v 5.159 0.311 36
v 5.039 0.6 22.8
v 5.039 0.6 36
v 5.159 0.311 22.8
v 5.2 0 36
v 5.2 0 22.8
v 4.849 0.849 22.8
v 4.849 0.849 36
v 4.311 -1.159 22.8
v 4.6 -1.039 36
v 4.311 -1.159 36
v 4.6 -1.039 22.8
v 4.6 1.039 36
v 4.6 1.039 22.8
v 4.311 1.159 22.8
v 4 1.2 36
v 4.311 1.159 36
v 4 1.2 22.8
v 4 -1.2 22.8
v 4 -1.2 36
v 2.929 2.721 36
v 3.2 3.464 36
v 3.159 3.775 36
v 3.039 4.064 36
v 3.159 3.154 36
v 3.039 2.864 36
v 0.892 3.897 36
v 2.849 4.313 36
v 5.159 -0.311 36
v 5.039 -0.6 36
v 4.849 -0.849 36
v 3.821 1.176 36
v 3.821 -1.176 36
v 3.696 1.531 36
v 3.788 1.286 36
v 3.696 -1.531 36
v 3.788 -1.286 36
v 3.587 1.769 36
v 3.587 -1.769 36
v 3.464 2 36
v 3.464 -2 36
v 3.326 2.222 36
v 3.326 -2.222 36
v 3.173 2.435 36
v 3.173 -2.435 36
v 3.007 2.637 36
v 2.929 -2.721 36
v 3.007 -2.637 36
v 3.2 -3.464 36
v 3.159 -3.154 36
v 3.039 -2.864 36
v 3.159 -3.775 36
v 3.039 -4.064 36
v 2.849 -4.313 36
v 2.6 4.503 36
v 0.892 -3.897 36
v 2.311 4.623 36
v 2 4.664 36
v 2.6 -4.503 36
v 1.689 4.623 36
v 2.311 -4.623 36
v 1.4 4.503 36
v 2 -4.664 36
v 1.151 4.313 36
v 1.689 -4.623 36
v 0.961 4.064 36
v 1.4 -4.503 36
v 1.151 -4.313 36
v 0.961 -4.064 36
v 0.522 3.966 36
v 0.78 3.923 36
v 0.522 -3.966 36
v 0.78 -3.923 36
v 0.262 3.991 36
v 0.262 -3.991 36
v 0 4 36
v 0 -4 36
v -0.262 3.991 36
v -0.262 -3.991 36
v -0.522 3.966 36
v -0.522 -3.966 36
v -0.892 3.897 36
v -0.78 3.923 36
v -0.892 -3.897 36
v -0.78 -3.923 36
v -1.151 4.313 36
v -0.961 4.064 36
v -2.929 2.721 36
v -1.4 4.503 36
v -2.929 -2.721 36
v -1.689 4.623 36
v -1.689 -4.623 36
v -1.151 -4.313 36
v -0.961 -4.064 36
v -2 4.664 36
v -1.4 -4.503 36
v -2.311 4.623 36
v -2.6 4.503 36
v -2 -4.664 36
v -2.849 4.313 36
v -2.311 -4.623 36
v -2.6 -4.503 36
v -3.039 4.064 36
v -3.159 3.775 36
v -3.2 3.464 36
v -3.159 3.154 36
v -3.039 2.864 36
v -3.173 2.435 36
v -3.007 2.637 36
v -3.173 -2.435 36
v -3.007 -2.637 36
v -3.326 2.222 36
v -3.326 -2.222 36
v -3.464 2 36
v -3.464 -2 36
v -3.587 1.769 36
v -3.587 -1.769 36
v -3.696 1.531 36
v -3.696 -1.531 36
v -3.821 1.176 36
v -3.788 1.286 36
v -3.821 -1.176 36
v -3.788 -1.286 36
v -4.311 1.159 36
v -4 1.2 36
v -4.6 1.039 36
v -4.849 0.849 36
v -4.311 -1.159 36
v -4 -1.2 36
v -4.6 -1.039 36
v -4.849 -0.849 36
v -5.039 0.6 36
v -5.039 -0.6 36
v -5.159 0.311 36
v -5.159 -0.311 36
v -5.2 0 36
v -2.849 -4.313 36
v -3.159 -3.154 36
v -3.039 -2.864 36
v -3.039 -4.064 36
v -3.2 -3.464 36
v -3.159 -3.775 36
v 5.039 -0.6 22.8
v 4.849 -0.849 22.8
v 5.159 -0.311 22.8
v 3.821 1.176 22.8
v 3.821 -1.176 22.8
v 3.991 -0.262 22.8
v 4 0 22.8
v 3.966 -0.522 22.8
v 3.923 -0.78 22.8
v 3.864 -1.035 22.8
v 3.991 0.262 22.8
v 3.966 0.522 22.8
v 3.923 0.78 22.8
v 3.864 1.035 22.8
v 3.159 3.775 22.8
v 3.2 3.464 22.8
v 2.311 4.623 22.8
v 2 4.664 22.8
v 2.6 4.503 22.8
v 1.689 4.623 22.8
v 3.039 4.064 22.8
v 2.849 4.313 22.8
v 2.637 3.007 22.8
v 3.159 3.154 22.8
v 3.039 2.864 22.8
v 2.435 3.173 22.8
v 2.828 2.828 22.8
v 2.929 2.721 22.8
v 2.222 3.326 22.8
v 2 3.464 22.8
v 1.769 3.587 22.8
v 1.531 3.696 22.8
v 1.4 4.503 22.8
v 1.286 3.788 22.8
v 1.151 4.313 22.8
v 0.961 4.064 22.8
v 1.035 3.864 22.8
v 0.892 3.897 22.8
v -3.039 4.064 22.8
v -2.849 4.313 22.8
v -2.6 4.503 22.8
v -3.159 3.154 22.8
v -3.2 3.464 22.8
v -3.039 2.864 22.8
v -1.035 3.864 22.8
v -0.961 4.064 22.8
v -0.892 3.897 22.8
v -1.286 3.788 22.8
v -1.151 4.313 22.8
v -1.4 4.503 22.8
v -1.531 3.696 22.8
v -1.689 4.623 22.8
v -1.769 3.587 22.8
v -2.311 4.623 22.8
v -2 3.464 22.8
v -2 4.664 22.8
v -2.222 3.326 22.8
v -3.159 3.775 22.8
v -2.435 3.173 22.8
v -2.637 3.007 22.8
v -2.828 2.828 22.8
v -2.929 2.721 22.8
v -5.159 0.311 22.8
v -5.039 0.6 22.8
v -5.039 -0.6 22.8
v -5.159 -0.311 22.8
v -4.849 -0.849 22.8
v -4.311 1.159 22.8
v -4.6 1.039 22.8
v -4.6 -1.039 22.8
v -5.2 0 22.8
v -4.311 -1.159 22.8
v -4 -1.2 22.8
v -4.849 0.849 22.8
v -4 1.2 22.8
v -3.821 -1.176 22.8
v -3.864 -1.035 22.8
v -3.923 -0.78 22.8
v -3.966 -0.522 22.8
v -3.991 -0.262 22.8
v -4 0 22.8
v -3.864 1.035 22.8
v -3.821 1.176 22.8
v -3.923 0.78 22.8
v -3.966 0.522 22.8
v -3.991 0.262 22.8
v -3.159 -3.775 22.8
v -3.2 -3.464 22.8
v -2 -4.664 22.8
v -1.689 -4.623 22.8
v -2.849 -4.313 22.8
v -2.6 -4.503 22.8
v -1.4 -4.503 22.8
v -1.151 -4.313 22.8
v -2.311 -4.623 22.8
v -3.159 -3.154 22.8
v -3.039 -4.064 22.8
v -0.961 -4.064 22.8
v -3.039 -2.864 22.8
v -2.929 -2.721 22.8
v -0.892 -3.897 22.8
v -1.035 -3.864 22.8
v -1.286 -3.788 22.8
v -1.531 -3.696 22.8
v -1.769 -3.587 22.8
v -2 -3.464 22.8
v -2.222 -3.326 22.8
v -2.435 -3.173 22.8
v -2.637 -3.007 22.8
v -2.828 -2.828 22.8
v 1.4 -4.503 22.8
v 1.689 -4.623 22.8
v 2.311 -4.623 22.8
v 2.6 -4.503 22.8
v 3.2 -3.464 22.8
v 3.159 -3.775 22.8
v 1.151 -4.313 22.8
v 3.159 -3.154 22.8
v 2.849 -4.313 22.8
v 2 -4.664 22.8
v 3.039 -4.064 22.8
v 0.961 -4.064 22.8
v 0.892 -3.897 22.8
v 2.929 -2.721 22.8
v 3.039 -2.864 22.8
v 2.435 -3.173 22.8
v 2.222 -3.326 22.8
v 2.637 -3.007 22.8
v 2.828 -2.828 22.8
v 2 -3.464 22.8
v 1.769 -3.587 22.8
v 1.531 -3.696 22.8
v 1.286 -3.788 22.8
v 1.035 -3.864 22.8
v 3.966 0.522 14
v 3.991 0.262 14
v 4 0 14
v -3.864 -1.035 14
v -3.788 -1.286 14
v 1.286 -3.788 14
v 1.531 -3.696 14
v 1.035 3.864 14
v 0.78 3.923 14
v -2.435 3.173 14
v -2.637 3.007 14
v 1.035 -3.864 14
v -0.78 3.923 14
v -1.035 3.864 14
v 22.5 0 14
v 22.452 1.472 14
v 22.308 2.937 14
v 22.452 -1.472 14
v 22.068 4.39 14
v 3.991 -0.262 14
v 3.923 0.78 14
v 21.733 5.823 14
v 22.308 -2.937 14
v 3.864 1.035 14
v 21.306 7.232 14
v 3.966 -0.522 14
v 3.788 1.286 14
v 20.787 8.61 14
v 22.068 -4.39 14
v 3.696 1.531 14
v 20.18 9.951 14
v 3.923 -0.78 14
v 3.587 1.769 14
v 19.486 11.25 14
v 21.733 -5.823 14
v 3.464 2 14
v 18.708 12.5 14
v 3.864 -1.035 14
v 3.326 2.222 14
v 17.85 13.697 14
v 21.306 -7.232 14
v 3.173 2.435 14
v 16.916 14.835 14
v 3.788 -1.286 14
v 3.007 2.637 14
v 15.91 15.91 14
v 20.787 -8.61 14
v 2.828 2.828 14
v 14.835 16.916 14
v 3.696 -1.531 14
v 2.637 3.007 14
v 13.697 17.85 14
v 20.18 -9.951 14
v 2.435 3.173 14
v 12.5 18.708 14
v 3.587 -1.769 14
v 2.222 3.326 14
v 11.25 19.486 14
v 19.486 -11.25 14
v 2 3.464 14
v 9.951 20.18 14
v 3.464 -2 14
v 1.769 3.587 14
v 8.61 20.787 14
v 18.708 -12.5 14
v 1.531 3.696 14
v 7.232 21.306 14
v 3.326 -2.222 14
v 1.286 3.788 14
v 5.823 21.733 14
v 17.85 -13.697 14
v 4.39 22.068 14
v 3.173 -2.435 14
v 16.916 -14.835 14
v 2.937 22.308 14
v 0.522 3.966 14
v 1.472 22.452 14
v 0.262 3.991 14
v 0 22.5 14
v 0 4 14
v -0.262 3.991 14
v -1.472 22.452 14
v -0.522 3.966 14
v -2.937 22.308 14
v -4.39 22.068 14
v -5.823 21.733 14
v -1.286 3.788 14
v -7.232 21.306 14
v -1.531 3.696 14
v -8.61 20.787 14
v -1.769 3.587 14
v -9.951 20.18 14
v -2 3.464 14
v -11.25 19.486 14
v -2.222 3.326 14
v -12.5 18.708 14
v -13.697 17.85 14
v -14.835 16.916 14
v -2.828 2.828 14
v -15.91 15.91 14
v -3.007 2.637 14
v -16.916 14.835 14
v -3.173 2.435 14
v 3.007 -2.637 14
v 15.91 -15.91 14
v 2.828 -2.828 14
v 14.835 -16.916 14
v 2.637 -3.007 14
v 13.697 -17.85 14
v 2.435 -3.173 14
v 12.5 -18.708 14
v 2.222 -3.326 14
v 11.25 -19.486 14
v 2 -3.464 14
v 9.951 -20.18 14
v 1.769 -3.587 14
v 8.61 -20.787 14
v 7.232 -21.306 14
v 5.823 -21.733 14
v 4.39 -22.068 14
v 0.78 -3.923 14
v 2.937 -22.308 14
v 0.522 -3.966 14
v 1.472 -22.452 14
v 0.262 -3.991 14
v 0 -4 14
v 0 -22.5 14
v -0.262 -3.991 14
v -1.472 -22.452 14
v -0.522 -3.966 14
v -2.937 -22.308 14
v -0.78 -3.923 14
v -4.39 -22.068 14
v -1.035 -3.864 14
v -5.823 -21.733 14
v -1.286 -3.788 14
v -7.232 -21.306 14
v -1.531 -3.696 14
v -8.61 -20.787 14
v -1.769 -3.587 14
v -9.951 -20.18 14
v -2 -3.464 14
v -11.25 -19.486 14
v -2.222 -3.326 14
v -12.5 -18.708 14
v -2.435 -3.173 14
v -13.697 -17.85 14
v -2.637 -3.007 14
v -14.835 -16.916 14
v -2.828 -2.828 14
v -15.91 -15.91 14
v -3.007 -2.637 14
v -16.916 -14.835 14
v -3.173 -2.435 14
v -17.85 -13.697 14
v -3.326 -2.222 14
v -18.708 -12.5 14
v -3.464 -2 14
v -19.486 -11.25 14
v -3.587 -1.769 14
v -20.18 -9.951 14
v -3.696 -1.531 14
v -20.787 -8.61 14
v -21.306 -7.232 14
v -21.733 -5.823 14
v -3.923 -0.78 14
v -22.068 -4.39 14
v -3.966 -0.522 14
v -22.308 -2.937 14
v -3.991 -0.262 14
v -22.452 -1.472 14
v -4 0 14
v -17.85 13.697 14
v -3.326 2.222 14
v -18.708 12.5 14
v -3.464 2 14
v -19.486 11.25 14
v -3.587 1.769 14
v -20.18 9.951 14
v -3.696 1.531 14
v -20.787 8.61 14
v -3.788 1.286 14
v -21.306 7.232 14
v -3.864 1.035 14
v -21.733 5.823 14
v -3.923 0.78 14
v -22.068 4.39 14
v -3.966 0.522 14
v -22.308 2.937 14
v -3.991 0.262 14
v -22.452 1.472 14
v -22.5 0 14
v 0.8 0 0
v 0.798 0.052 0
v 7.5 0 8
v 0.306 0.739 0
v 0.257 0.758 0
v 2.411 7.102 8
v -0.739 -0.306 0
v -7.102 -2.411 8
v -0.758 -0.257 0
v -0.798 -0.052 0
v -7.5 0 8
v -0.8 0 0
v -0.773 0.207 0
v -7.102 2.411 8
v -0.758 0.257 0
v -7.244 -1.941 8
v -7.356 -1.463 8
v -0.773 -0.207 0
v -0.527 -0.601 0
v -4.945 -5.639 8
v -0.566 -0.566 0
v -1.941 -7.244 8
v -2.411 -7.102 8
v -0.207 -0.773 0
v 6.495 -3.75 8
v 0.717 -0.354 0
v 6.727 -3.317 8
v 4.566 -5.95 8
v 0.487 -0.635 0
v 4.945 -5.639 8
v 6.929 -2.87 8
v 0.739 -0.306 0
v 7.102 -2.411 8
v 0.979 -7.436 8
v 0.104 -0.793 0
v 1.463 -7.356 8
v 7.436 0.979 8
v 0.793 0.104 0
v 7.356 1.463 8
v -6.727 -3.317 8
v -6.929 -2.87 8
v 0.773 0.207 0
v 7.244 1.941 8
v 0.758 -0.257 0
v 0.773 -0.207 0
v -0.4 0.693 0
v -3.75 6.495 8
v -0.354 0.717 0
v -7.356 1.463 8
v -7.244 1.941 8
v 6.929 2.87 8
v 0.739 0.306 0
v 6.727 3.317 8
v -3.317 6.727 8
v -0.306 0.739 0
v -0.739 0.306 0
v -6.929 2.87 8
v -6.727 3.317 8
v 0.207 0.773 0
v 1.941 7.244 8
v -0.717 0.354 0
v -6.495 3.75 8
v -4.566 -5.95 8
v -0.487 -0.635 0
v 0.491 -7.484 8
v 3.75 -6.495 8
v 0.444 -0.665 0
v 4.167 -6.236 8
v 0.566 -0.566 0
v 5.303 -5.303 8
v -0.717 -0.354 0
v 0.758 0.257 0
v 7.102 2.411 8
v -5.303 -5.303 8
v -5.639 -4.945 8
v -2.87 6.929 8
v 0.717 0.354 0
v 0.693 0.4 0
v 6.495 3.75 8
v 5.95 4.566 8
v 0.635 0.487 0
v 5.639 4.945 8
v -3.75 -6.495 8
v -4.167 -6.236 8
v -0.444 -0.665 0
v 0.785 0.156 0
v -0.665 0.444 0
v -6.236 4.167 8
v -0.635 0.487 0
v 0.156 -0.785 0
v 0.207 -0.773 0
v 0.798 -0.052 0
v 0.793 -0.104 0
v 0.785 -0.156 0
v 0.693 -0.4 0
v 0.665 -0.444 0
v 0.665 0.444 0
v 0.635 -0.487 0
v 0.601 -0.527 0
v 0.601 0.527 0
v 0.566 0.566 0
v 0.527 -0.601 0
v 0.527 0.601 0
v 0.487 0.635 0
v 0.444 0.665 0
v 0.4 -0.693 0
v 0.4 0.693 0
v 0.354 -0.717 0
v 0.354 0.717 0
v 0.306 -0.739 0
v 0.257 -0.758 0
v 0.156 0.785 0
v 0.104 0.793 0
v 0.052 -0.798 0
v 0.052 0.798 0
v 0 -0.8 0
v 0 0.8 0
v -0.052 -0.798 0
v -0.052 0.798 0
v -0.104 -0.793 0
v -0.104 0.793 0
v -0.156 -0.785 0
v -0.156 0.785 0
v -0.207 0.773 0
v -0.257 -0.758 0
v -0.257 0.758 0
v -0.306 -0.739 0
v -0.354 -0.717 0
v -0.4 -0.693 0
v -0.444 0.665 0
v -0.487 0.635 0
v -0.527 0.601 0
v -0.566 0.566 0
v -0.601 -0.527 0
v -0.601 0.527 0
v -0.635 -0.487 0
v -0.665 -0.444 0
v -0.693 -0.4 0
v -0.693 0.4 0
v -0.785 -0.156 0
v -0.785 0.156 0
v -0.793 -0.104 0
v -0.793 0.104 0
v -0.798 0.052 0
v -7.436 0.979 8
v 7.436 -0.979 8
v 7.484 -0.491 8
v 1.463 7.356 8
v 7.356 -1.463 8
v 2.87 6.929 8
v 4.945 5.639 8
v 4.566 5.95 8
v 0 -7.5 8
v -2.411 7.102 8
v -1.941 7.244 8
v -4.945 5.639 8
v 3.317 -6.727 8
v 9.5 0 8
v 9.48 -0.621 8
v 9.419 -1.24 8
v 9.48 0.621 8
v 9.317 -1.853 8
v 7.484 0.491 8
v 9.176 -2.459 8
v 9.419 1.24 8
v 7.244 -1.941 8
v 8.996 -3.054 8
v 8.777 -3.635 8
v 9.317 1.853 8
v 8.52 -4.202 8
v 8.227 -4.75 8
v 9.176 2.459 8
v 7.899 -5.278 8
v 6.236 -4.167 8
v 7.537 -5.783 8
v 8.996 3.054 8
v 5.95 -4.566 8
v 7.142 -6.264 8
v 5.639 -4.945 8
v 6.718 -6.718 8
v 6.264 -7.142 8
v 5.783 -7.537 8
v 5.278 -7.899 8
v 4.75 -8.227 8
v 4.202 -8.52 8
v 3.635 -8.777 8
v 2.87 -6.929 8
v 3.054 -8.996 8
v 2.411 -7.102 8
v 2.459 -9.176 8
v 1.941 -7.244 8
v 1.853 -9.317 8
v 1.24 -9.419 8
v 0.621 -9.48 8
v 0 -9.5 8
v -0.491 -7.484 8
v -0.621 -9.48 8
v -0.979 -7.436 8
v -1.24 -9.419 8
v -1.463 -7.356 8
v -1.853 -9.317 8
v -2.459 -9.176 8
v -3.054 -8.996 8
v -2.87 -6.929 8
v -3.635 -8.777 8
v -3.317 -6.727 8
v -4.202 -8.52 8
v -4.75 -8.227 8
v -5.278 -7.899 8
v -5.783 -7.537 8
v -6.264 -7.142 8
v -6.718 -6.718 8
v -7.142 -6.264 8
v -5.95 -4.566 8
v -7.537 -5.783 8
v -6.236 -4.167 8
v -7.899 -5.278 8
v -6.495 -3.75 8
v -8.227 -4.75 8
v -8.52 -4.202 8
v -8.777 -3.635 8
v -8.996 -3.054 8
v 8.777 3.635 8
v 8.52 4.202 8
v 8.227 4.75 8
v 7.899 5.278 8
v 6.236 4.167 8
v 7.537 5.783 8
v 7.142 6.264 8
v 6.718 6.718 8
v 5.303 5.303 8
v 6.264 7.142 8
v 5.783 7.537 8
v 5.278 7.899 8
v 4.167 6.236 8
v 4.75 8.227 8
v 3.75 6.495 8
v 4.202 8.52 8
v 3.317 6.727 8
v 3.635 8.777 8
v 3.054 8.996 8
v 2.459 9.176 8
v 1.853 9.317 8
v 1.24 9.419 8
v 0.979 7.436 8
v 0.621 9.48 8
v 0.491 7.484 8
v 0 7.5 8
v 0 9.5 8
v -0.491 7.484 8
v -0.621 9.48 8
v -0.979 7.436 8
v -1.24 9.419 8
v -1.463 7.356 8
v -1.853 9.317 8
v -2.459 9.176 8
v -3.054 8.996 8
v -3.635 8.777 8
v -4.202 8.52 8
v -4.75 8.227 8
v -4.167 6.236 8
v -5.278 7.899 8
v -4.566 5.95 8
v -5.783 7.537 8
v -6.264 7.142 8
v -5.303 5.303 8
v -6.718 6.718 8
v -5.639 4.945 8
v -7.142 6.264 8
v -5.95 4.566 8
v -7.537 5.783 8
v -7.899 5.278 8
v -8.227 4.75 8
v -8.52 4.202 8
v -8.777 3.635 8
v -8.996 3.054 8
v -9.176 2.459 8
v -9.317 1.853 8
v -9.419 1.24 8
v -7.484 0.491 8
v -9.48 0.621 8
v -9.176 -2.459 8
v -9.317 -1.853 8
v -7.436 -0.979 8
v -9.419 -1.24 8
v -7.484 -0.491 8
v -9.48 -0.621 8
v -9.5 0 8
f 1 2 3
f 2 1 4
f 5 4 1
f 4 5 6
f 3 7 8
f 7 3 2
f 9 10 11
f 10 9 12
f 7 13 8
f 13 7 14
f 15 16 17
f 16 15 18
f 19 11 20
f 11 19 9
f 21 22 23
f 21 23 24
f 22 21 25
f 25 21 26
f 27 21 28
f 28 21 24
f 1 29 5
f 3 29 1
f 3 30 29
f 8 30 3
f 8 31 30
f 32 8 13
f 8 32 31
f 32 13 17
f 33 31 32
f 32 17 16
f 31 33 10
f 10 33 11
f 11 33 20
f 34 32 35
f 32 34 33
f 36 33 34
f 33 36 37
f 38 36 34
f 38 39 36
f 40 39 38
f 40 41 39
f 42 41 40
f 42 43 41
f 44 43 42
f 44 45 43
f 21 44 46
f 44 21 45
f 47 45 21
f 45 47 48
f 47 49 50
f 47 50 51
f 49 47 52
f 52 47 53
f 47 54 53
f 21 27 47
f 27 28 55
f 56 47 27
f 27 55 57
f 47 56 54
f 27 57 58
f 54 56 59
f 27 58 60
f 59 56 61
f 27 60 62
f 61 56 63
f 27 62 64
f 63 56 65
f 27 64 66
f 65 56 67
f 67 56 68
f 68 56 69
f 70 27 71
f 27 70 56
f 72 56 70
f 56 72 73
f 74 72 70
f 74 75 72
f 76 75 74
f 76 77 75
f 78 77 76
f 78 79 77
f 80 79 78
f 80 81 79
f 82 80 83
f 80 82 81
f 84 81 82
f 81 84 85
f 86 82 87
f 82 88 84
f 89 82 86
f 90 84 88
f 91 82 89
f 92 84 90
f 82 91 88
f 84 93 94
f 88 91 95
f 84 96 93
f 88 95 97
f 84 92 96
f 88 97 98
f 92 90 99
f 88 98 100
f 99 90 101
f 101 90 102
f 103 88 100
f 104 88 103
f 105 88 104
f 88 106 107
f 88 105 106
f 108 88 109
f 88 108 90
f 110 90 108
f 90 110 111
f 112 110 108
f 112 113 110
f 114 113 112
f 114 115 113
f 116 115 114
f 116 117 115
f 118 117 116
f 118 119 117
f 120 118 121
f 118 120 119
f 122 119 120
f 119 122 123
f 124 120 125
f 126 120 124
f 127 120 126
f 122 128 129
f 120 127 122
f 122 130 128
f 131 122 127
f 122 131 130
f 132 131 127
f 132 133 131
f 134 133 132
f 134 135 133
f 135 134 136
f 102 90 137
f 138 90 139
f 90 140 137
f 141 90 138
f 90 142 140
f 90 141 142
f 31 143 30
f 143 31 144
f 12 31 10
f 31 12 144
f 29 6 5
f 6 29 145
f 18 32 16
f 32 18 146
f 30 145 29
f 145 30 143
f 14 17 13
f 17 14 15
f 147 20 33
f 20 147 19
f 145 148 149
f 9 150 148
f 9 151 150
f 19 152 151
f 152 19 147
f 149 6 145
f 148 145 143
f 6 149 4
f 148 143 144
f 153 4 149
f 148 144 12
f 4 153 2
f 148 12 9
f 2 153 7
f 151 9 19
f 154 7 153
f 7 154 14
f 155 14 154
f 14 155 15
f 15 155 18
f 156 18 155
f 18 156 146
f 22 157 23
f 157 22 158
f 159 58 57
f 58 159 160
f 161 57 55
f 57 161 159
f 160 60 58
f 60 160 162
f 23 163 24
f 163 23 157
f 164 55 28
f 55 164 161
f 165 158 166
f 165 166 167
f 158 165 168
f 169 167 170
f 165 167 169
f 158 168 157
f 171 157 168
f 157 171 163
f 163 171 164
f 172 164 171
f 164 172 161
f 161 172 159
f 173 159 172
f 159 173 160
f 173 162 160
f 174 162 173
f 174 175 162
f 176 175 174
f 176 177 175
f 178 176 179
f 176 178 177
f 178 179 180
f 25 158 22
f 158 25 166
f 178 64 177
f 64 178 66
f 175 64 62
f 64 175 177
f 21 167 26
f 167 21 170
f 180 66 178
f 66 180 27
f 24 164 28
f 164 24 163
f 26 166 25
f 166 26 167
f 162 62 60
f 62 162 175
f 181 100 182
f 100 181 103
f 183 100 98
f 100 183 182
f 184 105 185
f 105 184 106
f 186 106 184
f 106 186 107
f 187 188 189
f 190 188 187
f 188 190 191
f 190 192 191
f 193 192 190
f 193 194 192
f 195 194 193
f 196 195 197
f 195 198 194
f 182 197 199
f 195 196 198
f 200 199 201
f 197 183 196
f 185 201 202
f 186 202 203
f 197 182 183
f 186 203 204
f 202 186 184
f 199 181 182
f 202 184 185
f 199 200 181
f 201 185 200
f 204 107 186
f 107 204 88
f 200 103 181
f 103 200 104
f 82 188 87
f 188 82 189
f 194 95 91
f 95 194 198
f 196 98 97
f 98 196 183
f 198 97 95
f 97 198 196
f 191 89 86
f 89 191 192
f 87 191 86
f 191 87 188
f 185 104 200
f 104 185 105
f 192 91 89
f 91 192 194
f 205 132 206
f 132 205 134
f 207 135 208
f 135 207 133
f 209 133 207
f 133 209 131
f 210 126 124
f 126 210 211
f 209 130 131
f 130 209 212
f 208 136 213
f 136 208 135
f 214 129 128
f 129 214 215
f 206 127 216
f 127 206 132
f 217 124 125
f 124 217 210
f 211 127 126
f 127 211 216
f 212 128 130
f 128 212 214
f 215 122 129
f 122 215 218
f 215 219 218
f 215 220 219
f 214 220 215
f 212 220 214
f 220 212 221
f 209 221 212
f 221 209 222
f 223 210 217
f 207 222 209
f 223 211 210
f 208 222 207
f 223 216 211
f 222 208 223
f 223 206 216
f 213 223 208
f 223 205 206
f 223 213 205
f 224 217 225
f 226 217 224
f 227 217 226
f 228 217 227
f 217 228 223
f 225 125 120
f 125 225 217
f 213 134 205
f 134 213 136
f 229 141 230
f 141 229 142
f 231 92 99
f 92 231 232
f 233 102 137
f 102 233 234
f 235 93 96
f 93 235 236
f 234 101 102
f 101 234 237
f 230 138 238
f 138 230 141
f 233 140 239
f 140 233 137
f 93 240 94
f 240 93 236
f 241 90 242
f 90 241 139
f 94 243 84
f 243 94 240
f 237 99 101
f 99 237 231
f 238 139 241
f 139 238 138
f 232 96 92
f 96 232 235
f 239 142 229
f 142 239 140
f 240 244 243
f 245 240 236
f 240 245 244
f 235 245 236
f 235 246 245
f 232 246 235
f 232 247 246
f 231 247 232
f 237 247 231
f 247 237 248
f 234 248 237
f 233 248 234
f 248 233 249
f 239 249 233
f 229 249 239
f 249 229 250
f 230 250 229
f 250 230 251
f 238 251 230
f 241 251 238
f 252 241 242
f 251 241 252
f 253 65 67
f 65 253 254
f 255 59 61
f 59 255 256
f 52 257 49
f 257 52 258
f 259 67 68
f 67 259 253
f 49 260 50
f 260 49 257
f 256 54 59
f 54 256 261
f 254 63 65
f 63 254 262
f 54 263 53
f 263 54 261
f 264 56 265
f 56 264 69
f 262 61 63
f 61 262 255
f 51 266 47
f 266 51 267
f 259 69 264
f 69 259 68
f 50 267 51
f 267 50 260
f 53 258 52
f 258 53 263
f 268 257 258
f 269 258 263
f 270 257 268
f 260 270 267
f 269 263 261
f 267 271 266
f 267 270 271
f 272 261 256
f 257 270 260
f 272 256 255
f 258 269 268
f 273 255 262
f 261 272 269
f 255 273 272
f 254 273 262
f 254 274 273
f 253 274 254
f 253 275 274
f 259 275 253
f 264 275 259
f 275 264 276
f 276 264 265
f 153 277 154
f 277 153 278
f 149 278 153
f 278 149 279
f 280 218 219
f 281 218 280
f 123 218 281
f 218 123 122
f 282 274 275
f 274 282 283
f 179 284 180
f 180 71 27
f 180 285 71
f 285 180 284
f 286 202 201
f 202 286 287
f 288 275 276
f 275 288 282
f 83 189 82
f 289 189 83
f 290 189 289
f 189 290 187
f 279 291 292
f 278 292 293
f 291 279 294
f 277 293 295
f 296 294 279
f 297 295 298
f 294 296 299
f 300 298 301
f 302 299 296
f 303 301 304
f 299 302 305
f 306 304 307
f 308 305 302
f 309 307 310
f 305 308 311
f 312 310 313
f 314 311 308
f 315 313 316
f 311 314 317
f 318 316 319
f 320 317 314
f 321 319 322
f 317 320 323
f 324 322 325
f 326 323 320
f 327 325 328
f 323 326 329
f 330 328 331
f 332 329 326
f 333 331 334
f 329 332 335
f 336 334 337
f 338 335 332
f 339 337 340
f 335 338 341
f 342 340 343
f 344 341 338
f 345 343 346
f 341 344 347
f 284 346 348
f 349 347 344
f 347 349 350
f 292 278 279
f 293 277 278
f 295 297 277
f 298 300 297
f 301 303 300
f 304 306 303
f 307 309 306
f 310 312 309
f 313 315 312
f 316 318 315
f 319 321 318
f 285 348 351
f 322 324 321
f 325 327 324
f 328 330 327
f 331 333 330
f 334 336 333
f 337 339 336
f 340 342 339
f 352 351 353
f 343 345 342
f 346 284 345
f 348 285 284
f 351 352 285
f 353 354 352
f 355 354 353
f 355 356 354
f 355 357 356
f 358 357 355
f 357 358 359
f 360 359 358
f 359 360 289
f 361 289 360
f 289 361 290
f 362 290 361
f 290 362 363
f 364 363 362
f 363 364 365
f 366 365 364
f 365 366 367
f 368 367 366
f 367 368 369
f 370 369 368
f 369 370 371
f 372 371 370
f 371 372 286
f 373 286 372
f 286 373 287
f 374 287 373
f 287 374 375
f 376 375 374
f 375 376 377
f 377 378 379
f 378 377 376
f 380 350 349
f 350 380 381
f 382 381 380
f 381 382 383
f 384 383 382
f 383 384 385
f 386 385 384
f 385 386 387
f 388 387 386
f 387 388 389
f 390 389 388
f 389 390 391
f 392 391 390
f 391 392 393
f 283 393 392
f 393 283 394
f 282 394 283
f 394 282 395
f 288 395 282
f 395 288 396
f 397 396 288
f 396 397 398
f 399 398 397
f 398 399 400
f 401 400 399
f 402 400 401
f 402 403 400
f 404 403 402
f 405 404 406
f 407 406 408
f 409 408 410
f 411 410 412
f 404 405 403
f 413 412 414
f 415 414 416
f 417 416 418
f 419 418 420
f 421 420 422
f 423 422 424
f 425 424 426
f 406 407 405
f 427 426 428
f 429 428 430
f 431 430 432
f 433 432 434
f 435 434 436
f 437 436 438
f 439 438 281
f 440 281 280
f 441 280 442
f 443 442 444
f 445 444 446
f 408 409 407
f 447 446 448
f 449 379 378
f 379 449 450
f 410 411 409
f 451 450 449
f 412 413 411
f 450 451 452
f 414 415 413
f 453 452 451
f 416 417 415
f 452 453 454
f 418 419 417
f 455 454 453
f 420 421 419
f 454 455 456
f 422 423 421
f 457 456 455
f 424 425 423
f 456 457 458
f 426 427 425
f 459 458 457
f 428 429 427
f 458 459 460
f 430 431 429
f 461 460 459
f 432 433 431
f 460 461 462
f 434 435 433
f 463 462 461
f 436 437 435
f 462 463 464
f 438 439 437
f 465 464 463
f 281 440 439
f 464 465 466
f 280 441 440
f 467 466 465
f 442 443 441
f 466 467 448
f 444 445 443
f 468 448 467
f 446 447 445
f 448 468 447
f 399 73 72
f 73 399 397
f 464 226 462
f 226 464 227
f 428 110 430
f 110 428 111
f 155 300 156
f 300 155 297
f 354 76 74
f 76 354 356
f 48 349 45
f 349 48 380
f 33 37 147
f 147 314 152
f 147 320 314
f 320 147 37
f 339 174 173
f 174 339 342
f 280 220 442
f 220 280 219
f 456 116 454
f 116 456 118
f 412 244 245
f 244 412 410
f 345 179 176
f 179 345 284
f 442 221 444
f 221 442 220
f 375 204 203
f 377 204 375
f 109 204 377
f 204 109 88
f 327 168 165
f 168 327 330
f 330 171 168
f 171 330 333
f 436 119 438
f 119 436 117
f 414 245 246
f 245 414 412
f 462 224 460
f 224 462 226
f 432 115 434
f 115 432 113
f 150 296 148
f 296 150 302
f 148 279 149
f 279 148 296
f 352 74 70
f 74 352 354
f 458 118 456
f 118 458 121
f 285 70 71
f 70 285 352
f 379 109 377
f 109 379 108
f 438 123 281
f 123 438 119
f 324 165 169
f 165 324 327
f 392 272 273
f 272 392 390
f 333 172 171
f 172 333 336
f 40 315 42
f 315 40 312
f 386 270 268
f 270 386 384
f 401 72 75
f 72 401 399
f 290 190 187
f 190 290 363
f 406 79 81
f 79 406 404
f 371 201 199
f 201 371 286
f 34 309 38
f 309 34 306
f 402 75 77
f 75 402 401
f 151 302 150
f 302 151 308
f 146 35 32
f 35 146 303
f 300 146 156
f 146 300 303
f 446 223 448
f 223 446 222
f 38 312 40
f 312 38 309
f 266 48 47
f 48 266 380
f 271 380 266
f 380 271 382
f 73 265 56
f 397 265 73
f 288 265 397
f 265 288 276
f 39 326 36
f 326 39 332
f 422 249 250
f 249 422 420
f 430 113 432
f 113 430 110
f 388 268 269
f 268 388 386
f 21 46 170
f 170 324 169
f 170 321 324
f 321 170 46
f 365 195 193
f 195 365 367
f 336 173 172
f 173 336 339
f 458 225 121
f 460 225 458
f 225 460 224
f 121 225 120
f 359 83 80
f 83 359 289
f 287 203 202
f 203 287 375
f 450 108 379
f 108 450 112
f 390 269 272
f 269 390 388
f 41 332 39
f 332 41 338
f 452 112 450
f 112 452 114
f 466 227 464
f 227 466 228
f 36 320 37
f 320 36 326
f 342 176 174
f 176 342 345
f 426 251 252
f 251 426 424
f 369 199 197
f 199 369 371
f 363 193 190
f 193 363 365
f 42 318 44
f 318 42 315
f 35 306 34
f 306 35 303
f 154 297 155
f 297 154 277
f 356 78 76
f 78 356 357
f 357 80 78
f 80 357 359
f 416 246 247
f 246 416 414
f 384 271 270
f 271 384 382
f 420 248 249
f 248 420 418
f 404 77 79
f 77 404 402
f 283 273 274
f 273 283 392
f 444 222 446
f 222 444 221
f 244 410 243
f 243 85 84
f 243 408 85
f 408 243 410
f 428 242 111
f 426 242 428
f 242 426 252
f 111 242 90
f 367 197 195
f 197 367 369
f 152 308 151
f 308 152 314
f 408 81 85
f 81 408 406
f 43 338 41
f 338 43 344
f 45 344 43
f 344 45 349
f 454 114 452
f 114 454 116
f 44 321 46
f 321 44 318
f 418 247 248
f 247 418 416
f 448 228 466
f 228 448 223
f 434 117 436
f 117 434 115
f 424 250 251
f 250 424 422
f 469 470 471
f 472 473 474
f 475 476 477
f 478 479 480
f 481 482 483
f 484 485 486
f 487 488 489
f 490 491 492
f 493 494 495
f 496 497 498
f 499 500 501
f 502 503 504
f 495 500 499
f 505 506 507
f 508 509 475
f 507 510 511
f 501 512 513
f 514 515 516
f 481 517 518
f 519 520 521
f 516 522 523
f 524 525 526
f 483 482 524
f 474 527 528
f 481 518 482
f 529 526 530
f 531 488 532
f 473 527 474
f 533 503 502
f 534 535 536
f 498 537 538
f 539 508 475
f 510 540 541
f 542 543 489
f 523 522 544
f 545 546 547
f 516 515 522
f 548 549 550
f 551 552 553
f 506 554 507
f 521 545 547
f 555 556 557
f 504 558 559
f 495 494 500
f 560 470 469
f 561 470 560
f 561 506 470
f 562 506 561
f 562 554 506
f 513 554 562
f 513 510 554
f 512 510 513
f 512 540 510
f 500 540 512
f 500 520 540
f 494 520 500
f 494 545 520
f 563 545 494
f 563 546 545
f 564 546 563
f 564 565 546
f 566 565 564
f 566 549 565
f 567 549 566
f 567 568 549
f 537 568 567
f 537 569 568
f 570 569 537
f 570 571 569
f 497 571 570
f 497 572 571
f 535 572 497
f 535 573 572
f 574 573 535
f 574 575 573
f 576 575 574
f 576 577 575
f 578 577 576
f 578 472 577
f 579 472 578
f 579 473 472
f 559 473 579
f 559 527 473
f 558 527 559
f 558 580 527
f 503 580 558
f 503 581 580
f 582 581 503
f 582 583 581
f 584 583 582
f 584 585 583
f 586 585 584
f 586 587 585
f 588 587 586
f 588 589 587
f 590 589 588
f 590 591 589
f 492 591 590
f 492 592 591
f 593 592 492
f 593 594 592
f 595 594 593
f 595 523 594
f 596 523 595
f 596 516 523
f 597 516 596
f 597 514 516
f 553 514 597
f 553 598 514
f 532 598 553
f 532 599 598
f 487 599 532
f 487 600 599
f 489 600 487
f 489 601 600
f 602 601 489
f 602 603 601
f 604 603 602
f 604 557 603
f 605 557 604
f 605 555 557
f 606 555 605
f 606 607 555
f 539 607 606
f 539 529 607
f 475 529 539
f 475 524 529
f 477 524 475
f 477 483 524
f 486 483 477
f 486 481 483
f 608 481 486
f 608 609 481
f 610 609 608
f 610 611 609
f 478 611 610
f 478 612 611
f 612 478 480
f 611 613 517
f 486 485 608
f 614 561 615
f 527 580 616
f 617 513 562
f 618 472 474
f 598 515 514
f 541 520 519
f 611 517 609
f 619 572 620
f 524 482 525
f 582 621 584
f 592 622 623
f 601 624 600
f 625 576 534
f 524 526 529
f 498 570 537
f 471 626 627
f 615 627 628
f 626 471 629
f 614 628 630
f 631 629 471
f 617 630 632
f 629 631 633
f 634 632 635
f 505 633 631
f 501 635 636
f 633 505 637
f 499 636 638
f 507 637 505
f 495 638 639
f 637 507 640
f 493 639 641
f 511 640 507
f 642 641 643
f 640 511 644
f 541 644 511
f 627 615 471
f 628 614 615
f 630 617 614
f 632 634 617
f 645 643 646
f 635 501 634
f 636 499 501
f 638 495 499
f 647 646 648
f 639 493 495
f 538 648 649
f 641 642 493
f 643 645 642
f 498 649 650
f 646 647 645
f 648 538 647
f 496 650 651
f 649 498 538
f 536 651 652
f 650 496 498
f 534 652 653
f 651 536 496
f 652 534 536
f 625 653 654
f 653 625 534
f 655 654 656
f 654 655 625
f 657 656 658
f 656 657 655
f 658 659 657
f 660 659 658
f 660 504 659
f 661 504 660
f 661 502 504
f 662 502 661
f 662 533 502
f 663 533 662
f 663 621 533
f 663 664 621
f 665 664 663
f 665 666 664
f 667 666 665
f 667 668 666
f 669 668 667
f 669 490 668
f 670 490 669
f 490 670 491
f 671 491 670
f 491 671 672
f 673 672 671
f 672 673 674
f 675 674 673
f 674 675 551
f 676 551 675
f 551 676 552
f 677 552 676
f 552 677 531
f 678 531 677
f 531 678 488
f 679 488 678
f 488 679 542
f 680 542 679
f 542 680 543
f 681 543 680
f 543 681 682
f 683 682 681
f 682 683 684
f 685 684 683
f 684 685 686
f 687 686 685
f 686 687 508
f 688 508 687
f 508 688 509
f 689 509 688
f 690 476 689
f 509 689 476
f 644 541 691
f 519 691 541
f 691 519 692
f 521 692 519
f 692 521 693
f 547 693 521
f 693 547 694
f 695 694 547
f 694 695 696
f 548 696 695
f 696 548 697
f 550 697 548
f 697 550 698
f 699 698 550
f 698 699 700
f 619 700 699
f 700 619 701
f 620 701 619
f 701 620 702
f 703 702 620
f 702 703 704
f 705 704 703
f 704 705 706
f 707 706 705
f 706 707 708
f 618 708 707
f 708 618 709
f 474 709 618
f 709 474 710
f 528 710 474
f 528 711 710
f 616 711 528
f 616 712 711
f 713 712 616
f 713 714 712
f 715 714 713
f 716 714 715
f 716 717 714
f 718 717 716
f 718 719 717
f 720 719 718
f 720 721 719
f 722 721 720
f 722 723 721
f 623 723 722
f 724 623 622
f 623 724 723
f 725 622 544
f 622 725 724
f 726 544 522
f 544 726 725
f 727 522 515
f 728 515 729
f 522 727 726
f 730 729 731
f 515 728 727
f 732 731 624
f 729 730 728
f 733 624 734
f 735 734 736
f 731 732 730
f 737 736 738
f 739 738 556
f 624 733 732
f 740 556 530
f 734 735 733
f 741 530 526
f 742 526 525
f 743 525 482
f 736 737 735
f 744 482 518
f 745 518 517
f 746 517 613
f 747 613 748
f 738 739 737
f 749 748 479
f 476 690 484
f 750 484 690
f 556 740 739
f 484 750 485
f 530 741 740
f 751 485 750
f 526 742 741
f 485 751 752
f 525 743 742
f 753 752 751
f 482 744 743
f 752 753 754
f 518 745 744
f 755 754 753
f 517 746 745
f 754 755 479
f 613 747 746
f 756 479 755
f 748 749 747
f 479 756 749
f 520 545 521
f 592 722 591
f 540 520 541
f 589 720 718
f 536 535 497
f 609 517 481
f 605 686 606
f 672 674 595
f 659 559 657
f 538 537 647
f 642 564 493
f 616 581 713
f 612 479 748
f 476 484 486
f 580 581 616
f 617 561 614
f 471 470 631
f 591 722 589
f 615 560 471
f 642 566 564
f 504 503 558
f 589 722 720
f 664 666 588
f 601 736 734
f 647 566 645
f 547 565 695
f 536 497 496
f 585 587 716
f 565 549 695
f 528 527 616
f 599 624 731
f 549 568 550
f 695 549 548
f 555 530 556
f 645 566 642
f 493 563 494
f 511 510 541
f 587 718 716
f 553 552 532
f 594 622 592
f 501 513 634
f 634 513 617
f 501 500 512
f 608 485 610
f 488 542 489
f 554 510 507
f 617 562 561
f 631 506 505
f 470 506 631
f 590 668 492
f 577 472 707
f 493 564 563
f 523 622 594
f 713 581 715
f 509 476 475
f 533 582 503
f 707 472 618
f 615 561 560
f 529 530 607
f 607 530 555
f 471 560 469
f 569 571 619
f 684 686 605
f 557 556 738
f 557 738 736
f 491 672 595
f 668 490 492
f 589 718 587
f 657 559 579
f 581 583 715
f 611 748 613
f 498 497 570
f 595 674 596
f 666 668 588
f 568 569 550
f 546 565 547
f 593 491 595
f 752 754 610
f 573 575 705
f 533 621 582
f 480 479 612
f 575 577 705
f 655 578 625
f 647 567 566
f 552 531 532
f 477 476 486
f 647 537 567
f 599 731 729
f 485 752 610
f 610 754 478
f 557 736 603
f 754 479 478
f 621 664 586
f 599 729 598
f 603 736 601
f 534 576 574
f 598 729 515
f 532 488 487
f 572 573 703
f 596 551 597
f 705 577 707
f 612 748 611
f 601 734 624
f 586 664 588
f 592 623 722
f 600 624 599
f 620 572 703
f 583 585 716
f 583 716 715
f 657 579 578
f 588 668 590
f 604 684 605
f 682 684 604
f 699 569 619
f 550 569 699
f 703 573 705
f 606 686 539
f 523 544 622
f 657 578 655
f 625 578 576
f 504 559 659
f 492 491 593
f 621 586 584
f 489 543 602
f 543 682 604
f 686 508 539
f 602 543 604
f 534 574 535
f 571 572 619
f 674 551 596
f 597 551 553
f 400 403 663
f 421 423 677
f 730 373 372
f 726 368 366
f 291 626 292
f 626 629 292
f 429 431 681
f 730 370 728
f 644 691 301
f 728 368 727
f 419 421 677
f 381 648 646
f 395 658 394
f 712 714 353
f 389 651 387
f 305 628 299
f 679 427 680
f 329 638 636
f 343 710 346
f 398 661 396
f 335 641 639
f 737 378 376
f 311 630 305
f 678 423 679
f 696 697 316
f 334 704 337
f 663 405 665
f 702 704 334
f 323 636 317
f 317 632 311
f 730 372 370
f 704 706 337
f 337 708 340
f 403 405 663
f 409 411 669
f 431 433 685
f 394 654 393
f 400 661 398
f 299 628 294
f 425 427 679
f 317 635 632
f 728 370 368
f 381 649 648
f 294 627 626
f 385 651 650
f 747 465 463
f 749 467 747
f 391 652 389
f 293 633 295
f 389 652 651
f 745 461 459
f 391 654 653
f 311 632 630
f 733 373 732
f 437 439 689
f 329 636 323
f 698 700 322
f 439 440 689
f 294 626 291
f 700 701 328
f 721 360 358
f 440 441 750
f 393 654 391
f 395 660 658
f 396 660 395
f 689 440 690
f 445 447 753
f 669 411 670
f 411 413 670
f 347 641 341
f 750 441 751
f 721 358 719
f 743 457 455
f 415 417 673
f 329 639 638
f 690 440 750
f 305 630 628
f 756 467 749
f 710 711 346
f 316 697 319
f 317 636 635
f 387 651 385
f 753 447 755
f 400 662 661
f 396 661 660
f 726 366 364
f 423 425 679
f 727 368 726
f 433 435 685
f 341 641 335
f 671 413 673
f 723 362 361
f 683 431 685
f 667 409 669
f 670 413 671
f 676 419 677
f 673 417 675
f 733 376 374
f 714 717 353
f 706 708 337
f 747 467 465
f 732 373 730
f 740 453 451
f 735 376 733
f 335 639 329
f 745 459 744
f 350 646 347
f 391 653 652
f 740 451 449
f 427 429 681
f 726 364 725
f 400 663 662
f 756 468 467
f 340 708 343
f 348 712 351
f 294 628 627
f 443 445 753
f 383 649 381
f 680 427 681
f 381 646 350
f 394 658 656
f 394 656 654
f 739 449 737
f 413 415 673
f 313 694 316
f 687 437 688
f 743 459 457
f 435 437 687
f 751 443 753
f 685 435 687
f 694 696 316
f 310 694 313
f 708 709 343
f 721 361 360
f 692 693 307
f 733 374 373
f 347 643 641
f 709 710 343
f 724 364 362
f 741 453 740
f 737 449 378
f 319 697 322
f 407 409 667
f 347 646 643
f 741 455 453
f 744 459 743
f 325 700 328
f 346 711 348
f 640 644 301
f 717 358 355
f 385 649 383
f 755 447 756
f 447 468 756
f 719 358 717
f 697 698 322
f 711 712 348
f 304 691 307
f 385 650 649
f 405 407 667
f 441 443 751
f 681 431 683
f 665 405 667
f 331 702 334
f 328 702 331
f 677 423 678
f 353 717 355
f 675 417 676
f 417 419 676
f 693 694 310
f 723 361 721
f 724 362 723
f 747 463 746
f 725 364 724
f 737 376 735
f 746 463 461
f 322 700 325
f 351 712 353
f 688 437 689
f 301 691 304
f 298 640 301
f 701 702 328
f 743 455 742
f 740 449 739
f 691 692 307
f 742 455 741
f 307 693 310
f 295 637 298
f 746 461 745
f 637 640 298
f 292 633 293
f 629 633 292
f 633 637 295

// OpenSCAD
// ============================================================
// SPINNING TOP — design for physics
// ============================================================
// The rule: weight LOW and WIDE spins long. Tall and skinny
// wobbles and dies. Change the numbers, print two, race them.
//
// Print: in Bambu Studio hit "Auto Orient" and turn on
// tree supports (the tip needs a little help). ~25 min.
// ============================================================

// ------------ CHANGE THESE ------------
disc_diameter = 45;   // wider = more stable (to a point...)
disc_height   = 6;    // thicker disc = more spinning mass
tip_height    = 8;    // the cone it spins on
stem_height   = 22;   // the part you grab and twist
stem_diameter = 8;
grip_bumps    = 6;    // ridges on the stem so fingers grip
// ---------------------------------------

$fn = 96;

// ---- tip: the point it spins on (bottom, z = 0) ----
cylinder(h = tip_height, r1 = 0.8, r2 = disc_diameter/6);

// ---- disc: the flywheel, where the mass lives ----
// Tapers outward as it rises: keeps the mass LOW.
translate([0, 0, tip_height])
    cylinder(h = disc_height,
             r1 = disc_diameter/6 + 2,
             r2 = disc_diameter/2);

// ---- stem: what you twist ----
translate([0, 0, tip_height + disc_height]) {
    cylinder(h = stem_height, r = stem_diameter/2);
    // grip ridges
    for (i = [0 : grip_bumps - 1])
        rotate([0, 0, i * 360 / grip_bumps])
            translate([stem_diameter/2, 0, stem_height * 0.4])
                cylinder(h = stem_height * 0.6, r = 1.2, $fn = 24);
}

// EXPERIMENTS (log results in your build log!):
//  1. disc_diameter 35 vs 55 — which spins longer?
//  2. disc_height 4 vs 10?
//  3. flip the disc taper (swap r1 and r2) so the mass sits
//     HIGH instead of low — feel the wobble, learn the why
//  4. ask Claude: "add a hole pattern in the disc so it whistles"
